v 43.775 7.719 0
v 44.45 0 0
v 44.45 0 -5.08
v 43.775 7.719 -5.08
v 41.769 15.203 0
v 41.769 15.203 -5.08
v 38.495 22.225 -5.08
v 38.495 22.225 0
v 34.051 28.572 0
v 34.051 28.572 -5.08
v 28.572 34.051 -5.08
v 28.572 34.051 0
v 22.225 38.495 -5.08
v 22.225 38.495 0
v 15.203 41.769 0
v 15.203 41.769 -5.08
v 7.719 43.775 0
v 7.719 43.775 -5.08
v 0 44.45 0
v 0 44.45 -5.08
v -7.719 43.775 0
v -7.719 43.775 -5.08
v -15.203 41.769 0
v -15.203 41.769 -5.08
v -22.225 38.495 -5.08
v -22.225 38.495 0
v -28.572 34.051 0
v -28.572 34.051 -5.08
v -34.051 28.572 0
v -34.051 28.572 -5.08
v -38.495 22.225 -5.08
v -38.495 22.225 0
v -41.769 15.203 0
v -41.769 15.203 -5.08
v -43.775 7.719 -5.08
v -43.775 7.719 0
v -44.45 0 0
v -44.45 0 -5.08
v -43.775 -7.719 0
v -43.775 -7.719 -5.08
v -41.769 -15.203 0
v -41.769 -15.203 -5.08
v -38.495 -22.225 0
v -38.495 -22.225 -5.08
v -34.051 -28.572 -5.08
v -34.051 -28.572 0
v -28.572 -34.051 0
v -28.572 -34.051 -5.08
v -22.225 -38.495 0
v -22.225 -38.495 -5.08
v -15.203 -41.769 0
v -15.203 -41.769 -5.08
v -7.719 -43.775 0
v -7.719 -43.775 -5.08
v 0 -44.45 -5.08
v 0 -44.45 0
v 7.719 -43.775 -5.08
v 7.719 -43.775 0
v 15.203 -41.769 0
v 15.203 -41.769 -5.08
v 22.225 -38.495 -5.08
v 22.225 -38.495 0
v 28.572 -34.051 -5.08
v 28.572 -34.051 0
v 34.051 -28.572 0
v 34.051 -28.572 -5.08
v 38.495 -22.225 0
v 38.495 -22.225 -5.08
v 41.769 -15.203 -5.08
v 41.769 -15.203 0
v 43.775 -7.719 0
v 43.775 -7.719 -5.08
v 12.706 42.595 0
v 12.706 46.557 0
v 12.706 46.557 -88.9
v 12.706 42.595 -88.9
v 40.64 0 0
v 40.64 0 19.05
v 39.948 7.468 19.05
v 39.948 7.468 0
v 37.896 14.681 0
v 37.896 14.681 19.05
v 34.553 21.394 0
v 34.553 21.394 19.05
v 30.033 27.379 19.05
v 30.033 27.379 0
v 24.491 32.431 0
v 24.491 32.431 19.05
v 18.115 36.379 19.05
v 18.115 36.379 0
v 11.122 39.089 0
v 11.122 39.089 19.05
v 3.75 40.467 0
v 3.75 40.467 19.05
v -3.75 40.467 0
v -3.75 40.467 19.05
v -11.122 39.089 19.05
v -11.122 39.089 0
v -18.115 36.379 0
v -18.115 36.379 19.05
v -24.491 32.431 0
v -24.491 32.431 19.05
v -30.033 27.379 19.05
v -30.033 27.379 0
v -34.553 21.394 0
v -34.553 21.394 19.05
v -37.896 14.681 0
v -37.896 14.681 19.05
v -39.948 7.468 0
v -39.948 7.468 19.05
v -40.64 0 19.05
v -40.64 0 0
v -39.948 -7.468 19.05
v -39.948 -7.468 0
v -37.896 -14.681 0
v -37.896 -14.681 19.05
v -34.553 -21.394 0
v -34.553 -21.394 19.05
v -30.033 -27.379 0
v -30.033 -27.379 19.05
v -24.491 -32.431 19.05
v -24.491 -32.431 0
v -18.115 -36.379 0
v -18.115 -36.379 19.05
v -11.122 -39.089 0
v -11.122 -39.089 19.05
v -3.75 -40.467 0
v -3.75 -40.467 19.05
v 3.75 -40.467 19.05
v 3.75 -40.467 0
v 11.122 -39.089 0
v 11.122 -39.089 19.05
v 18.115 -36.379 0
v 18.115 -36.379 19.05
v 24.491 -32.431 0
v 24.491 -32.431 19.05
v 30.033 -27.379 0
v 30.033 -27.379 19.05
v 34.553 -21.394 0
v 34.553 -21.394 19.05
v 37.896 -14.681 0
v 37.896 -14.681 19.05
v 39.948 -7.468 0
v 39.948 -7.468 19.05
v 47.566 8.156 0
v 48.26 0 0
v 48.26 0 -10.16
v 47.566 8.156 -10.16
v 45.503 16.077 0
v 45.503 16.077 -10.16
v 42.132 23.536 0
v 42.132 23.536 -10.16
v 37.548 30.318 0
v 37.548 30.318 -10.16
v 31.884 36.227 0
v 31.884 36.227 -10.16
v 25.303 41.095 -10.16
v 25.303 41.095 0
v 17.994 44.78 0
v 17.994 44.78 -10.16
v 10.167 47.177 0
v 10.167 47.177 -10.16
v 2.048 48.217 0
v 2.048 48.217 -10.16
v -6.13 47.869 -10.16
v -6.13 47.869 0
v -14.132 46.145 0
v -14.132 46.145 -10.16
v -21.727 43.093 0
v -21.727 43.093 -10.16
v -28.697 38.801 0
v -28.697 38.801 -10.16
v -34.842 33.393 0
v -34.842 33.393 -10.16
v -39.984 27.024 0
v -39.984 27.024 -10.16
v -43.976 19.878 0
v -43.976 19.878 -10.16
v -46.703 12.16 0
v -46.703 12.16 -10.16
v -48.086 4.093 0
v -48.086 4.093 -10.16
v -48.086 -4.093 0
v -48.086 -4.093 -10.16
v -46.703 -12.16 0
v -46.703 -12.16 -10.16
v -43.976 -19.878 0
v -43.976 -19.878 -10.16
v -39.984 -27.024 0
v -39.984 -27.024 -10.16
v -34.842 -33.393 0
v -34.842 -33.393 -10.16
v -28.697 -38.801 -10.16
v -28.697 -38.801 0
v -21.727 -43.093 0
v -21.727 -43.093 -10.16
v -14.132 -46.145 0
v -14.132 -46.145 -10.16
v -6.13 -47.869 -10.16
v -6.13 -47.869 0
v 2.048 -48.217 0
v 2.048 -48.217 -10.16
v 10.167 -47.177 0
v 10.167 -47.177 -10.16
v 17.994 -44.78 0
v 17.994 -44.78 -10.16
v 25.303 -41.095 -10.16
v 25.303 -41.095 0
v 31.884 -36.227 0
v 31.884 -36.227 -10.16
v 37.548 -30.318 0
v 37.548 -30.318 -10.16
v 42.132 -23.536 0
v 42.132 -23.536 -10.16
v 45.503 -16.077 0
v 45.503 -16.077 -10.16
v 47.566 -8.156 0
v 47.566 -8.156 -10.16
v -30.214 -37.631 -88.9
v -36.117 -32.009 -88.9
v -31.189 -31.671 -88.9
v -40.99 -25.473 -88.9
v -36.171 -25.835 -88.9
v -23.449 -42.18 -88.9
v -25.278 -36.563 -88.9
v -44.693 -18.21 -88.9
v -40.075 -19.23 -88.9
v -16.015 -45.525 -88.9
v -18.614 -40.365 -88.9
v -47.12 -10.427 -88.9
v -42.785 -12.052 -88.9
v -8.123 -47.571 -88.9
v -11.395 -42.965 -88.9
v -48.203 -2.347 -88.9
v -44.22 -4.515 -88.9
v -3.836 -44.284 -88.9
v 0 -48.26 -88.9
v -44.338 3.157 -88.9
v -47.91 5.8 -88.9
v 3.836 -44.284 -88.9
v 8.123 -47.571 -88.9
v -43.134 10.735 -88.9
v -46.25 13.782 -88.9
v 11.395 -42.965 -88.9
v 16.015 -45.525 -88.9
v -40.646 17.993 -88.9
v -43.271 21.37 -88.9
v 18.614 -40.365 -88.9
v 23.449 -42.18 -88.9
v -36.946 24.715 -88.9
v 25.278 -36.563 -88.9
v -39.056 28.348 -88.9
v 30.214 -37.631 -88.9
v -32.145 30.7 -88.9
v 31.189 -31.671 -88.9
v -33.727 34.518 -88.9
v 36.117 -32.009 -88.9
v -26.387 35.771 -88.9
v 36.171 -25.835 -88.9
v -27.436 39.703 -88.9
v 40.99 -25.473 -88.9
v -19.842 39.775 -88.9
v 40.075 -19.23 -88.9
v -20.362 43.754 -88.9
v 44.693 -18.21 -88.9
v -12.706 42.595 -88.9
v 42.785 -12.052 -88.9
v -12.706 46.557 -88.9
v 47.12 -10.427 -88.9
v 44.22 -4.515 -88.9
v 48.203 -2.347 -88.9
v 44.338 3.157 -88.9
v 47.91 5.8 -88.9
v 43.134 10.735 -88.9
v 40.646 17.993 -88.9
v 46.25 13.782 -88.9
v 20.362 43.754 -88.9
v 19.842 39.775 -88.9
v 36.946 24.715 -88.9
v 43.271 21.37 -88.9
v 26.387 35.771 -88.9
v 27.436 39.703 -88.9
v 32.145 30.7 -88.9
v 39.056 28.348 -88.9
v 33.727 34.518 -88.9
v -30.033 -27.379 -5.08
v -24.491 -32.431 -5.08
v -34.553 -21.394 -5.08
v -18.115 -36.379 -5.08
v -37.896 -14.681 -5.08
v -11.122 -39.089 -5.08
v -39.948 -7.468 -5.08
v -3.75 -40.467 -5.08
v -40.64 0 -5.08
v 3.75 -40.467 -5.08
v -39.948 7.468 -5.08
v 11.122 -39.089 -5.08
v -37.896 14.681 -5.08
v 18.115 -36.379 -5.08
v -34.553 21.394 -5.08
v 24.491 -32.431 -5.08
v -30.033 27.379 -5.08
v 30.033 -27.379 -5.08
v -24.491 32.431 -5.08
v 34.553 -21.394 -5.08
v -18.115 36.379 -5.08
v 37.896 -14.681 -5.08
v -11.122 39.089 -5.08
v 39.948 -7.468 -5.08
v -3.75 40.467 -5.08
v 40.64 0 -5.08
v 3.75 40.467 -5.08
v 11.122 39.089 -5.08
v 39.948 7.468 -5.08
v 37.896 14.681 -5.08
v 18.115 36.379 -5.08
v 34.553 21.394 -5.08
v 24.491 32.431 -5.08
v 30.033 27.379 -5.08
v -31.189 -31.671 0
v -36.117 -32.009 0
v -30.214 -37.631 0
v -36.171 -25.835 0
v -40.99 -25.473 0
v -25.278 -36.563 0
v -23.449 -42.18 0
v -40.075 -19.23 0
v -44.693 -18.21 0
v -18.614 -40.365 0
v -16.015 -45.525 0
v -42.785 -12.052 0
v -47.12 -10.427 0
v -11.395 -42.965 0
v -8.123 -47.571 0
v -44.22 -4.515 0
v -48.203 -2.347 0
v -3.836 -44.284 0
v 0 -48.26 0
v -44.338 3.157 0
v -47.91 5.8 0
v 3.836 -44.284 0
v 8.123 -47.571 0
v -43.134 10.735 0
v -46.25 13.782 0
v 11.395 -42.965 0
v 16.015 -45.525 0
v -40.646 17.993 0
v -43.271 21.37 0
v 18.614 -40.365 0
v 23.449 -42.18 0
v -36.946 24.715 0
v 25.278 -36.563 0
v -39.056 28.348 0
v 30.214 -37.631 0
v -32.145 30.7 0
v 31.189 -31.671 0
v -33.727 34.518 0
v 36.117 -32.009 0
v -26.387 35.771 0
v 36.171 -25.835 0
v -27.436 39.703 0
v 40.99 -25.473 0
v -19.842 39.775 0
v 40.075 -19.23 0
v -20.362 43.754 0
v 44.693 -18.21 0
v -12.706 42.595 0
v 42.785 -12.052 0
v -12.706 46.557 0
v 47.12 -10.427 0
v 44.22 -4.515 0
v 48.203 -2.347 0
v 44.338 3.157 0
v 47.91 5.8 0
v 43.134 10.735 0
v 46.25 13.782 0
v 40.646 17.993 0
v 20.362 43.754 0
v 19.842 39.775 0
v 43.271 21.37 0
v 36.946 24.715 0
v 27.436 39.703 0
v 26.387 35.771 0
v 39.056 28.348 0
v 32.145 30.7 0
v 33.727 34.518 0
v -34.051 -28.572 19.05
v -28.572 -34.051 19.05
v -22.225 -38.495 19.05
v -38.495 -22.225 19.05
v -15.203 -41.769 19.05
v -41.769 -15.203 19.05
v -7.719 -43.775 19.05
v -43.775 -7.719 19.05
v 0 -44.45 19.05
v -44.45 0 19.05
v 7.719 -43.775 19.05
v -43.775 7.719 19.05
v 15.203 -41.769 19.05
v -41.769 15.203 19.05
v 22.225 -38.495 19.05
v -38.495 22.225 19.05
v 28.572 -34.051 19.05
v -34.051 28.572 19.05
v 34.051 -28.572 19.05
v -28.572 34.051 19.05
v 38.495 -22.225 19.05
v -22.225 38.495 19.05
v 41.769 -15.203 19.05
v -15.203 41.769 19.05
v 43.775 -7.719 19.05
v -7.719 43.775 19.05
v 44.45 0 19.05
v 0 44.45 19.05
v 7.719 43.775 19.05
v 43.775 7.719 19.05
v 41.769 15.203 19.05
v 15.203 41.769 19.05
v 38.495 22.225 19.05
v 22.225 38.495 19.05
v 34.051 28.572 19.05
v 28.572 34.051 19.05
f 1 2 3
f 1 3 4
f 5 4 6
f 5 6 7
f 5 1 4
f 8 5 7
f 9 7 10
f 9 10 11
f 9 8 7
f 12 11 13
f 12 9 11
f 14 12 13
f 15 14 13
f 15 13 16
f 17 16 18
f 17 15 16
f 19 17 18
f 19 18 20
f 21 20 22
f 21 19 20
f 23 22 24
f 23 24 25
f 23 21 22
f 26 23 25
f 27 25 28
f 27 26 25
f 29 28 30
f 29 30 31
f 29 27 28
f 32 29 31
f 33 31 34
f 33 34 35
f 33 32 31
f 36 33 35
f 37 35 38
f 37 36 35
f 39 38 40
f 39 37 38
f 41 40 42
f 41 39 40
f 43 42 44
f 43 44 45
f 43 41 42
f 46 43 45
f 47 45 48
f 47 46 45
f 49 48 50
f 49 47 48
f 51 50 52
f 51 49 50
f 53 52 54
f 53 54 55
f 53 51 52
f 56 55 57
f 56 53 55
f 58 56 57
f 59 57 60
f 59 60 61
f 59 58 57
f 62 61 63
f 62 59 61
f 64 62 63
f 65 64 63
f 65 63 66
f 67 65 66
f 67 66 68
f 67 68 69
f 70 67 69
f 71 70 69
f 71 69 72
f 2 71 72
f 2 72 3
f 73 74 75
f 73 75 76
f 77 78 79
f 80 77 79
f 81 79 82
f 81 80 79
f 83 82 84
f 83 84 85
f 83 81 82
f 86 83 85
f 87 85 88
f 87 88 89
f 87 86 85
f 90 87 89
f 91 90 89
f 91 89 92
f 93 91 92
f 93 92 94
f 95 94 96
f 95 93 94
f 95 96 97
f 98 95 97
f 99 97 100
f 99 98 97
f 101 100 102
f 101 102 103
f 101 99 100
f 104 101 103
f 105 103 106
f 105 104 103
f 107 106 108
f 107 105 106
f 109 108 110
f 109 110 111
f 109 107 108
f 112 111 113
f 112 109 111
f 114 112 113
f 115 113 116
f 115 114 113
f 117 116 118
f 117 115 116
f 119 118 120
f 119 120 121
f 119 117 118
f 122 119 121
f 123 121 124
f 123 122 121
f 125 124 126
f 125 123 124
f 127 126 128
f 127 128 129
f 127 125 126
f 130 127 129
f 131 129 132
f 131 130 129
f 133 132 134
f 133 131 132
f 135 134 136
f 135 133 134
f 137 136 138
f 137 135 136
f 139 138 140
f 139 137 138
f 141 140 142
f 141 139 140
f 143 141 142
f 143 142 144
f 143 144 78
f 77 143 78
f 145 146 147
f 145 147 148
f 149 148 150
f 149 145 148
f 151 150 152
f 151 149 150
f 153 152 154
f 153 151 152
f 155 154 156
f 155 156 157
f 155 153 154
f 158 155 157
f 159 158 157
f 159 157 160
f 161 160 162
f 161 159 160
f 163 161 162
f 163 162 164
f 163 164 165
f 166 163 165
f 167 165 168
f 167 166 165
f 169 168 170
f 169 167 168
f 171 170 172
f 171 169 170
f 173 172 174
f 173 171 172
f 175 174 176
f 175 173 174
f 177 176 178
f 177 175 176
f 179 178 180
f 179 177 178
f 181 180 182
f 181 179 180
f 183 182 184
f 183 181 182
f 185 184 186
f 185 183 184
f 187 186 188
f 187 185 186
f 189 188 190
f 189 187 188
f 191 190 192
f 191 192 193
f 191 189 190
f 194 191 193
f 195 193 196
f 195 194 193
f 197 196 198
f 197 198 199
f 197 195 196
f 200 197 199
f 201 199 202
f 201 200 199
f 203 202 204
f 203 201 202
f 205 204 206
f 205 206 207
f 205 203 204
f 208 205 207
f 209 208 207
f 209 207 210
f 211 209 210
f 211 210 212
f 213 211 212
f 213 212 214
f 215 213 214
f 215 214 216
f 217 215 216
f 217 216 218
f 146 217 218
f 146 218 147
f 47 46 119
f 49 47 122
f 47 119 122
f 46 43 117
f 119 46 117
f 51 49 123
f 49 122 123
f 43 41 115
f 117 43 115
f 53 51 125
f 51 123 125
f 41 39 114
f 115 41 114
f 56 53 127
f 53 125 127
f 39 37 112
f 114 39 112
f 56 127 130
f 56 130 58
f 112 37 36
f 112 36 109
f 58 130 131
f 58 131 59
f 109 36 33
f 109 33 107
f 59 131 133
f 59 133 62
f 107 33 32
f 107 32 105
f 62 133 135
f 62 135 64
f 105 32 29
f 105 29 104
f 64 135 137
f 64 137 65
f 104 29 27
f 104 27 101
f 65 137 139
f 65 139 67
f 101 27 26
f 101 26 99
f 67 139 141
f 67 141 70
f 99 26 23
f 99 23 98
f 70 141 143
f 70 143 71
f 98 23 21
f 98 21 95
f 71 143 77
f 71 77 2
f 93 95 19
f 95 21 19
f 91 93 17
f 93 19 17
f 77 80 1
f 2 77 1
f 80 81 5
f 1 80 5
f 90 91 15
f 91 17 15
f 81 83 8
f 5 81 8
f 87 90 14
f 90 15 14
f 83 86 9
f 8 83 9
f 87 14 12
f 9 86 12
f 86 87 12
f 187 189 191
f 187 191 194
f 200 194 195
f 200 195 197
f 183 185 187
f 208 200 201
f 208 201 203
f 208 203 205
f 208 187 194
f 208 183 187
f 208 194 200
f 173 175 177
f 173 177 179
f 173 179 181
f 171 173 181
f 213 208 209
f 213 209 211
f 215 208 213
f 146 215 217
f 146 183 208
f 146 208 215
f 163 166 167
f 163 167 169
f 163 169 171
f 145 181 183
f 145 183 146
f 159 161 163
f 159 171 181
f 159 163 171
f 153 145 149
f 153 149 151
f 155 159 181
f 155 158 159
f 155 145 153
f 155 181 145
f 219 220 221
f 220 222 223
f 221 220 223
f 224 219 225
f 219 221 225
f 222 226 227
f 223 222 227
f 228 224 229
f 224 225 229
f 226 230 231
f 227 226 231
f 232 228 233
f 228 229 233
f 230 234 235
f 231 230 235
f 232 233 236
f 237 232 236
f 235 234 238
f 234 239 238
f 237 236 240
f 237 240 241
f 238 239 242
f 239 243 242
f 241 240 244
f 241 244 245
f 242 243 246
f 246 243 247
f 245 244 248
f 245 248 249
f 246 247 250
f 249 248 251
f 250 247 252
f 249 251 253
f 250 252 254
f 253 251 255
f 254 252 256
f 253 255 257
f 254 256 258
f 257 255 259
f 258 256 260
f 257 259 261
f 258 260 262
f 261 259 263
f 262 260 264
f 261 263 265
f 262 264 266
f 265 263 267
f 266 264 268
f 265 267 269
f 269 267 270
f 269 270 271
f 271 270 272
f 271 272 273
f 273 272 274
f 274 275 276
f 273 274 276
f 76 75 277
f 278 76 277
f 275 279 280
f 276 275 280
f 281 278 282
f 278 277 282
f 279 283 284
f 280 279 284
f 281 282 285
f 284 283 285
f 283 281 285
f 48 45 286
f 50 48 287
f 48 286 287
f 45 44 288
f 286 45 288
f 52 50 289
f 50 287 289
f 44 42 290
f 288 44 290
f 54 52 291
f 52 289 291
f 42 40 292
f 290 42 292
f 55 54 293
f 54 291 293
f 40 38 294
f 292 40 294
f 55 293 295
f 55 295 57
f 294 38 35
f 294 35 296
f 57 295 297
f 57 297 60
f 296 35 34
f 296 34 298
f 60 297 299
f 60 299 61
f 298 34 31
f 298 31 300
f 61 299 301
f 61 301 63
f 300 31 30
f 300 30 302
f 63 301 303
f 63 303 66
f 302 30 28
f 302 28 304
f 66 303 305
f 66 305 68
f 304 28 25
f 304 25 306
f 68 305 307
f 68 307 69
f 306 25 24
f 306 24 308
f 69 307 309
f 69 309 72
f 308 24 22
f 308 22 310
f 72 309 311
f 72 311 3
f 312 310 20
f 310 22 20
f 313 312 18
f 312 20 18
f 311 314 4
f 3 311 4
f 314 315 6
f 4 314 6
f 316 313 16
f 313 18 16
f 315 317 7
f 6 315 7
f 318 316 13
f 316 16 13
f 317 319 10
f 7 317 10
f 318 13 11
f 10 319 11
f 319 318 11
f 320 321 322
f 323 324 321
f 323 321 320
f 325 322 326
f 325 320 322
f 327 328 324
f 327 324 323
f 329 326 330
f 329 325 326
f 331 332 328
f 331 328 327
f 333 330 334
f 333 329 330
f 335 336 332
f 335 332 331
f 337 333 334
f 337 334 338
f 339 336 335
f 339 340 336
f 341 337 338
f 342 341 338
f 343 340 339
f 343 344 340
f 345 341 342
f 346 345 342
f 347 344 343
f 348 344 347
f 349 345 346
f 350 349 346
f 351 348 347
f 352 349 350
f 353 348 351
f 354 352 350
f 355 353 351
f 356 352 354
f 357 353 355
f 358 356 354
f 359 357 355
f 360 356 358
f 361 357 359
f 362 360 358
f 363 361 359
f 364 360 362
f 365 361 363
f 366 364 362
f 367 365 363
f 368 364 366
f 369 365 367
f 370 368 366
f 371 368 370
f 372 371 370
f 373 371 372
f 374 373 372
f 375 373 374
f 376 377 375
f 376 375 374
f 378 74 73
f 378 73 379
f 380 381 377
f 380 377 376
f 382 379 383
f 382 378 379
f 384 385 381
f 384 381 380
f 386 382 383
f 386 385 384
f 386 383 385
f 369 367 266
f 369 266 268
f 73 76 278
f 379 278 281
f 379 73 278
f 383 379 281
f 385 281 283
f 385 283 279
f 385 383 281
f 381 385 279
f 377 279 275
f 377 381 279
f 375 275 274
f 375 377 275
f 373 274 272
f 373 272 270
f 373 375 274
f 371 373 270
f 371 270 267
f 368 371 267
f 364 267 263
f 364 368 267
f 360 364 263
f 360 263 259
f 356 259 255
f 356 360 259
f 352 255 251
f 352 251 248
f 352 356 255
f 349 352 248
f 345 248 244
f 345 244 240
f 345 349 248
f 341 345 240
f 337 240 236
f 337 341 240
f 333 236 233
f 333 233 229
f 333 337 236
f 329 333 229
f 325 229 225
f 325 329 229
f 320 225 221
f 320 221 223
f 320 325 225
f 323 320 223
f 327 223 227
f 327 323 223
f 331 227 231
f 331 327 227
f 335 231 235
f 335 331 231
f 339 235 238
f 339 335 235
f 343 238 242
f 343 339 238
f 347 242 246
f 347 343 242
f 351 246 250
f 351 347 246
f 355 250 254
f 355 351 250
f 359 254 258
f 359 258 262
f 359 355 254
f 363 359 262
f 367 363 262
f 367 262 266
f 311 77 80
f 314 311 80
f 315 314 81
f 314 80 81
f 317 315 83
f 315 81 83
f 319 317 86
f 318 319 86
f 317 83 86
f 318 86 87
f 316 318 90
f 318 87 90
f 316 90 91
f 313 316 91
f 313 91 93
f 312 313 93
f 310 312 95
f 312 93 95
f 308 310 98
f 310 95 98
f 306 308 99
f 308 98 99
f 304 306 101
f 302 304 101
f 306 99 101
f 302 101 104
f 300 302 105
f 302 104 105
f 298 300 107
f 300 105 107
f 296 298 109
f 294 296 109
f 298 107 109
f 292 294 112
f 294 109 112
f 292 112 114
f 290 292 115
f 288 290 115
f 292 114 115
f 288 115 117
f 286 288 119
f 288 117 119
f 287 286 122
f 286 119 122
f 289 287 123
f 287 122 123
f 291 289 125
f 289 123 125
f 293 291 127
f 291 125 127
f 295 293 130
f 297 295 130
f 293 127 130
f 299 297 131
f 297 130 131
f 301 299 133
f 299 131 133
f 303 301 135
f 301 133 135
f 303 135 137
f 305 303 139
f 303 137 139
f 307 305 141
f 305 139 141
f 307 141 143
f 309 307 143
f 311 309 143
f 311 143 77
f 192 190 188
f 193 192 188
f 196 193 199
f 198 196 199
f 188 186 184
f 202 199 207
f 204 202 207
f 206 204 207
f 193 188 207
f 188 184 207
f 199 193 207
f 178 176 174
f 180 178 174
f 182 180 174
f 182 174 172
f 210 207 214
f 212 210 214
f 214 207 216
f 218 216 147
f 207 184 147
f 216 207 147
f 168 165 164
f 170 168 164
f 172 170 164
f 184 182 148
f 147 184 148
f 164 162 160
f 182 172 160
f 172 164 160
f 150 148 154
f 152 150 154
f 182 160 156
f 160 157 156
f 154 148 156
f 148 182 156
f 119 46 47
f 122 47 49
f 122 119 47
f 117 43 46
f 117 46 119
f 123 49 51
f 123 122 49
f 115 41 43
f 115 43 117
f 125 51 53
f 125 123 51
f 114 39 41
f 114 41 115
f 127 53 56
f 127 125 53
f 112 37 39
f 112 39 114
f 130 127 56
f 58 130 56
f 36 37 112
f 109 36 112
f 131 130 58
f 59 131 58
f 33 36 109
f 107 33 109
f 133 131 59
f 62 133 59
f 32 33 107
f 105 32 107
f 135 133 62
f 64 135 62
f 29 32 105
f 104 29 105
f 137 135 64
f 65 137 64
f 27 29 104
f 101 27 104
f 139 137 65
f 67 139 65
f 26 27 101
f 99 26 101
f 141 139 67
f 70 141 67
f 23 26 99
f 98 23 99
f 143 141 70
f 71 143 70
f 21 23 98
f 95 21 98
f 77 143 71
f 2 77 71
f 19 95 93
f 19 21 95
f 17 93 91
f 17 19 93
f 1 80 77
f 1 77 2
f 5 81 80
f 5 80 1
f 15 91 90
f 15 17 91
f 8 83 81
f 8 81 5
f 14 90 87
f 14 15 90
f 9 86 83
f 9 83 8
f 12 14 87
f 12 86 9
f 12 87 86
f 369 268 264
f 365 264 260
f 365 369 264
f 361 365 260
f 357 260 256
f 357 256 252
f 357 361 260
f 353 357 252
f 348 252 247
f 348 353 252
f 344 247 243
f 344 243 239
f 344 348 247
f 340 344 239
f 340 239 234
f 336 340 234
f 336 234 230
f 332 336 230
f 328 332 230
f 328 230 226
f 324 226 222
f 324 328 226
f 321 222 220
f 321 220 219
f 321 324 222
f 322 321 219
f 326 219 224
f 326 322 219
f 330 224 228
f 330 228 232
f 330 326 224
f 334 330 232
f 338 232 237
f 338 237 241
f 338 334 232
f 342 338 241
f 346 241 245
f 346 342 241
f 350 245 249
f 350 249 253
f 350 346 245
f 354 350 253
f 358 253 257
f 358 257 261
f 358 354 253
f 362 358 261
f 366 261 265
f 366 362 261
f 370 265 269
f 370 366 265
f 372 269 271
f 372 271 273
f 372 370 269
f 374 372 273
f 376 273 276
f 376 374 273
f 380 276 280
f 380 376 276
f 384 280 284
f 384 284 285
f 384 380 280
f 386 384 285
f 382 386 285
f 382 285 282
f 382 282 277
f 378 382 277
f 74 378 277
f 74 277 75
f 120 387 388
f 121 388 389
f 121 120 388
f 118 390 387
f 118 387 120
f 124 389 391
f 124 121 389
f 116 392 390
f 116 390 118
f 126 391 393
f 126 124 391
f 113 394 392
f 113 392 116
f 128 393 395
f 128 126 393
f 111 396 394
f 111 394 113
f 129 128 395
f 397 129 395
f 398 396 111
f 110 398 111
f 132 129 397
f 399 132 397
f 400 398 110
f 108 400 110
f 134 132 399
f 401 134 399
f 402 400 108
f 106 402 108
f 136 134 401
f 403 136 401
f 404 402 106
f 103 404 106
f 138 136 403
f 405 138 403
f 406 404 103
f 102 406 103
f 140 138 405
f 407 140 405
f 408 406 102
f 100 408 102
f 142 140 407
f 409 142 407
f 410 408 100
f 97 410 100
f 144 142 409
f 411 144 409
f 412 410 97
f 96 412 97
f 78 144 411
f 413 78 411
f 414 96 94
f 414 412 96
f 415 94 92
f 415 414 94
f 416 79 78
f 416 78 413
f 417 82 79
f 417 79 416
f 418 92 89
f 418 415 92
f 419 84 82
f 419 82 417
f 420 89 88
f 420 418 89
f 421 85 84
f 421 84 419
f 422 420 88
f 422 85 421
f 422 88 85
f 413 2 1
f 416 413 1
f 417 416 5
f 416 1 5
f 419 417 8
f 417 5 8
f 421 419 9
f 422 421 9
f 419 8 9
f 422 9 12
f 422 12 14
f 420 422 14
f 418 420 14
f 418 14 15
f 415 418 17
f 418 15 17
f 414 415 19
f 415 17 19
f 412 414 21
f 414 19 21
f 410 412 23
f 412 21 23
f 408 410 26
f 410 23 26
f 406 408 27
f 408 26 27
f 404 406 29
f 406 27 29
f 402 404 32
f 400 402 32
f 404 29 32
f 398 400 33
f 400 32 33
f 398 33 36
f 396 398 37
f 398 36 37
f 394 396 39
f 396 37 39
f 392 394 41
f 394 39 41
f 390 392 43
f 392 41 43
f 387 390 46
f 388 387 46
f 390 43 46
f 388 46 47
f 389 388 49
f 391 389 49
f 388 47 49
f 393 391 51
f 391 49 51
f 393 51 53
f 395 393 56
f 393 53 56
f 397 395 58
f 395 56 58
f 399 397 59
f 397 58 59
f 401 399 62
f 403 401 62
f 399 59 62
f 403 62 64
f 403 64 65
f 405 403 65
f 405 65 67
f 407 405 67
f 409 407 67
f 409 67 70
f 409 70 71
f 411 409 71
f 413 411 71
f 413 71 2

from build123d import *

# Parameters (mm, degrees)
F1_DEPTH = 88.9
F2_R     = 48.26
F2_R_2   = 30.48
F3_DEPTH = 10.16
F4_R     = 44.45
F4_R_2   = 40.64
F5_DEPTH = 19.05
F6_DEPTH = 5.08


# Not quite as in the source:
# - a feature names something its author has since deleted; it is built from what else it names


with BuildPart() as f1:
    # F0 (on Top) → F1 (new body)
    with BuildSketch(Plane.XY):
        with BuildLine():
            ThreePointArc((-12.7063658778, 46.5572321576), (0, -48.26), (12.7063658778, 46.5572321576))
            Line((12.7063658778, 46.5572321576), (12.7063658778, 42.5951579627))
            ThreePointArc((12.7063658778, 42.5951579627), (0, -44.4500385526), (-12.7063658778, 42.5951579627))
            Line((-12.7063658778, 42.5951579627), (-12.7063658778, 46.5572321576))
        make_face()
    extrude(amount=-F1_DEPTH)


with BuildPart() as f3:
    # F2 (on Top) → F3 (new body)
    with BuildSketch(Plane.XY):
        Circle(F2_R)
        Circle(F2_R_2, mode=Mode.SUBTRACT)
        Circle(F2_R_2)
    extrude(amount=-F3_DEPTH)


with BuildPart() as f5:
    # F4 (on Top) → F5 (new body)
    with BuildSketch(Plane.XY):
        Circle(F4_R)
        Circle(F4_R_2, mode=Mode.SUBTRACT)
    extrude(amount=F5_DEPTH)


with BuildPart() as f6:
    # F4 (on Top) → F6 (new body)
    with BuildSketch(Plane.XY):
        Circle(F4_R)
        Circle(F4_R_2, mode=Mode.SUBTRACT)
    extrude(amount=-F6_DEPTH)


solid = Compound([f1.part, f3.part, f5.part, f6.part])
